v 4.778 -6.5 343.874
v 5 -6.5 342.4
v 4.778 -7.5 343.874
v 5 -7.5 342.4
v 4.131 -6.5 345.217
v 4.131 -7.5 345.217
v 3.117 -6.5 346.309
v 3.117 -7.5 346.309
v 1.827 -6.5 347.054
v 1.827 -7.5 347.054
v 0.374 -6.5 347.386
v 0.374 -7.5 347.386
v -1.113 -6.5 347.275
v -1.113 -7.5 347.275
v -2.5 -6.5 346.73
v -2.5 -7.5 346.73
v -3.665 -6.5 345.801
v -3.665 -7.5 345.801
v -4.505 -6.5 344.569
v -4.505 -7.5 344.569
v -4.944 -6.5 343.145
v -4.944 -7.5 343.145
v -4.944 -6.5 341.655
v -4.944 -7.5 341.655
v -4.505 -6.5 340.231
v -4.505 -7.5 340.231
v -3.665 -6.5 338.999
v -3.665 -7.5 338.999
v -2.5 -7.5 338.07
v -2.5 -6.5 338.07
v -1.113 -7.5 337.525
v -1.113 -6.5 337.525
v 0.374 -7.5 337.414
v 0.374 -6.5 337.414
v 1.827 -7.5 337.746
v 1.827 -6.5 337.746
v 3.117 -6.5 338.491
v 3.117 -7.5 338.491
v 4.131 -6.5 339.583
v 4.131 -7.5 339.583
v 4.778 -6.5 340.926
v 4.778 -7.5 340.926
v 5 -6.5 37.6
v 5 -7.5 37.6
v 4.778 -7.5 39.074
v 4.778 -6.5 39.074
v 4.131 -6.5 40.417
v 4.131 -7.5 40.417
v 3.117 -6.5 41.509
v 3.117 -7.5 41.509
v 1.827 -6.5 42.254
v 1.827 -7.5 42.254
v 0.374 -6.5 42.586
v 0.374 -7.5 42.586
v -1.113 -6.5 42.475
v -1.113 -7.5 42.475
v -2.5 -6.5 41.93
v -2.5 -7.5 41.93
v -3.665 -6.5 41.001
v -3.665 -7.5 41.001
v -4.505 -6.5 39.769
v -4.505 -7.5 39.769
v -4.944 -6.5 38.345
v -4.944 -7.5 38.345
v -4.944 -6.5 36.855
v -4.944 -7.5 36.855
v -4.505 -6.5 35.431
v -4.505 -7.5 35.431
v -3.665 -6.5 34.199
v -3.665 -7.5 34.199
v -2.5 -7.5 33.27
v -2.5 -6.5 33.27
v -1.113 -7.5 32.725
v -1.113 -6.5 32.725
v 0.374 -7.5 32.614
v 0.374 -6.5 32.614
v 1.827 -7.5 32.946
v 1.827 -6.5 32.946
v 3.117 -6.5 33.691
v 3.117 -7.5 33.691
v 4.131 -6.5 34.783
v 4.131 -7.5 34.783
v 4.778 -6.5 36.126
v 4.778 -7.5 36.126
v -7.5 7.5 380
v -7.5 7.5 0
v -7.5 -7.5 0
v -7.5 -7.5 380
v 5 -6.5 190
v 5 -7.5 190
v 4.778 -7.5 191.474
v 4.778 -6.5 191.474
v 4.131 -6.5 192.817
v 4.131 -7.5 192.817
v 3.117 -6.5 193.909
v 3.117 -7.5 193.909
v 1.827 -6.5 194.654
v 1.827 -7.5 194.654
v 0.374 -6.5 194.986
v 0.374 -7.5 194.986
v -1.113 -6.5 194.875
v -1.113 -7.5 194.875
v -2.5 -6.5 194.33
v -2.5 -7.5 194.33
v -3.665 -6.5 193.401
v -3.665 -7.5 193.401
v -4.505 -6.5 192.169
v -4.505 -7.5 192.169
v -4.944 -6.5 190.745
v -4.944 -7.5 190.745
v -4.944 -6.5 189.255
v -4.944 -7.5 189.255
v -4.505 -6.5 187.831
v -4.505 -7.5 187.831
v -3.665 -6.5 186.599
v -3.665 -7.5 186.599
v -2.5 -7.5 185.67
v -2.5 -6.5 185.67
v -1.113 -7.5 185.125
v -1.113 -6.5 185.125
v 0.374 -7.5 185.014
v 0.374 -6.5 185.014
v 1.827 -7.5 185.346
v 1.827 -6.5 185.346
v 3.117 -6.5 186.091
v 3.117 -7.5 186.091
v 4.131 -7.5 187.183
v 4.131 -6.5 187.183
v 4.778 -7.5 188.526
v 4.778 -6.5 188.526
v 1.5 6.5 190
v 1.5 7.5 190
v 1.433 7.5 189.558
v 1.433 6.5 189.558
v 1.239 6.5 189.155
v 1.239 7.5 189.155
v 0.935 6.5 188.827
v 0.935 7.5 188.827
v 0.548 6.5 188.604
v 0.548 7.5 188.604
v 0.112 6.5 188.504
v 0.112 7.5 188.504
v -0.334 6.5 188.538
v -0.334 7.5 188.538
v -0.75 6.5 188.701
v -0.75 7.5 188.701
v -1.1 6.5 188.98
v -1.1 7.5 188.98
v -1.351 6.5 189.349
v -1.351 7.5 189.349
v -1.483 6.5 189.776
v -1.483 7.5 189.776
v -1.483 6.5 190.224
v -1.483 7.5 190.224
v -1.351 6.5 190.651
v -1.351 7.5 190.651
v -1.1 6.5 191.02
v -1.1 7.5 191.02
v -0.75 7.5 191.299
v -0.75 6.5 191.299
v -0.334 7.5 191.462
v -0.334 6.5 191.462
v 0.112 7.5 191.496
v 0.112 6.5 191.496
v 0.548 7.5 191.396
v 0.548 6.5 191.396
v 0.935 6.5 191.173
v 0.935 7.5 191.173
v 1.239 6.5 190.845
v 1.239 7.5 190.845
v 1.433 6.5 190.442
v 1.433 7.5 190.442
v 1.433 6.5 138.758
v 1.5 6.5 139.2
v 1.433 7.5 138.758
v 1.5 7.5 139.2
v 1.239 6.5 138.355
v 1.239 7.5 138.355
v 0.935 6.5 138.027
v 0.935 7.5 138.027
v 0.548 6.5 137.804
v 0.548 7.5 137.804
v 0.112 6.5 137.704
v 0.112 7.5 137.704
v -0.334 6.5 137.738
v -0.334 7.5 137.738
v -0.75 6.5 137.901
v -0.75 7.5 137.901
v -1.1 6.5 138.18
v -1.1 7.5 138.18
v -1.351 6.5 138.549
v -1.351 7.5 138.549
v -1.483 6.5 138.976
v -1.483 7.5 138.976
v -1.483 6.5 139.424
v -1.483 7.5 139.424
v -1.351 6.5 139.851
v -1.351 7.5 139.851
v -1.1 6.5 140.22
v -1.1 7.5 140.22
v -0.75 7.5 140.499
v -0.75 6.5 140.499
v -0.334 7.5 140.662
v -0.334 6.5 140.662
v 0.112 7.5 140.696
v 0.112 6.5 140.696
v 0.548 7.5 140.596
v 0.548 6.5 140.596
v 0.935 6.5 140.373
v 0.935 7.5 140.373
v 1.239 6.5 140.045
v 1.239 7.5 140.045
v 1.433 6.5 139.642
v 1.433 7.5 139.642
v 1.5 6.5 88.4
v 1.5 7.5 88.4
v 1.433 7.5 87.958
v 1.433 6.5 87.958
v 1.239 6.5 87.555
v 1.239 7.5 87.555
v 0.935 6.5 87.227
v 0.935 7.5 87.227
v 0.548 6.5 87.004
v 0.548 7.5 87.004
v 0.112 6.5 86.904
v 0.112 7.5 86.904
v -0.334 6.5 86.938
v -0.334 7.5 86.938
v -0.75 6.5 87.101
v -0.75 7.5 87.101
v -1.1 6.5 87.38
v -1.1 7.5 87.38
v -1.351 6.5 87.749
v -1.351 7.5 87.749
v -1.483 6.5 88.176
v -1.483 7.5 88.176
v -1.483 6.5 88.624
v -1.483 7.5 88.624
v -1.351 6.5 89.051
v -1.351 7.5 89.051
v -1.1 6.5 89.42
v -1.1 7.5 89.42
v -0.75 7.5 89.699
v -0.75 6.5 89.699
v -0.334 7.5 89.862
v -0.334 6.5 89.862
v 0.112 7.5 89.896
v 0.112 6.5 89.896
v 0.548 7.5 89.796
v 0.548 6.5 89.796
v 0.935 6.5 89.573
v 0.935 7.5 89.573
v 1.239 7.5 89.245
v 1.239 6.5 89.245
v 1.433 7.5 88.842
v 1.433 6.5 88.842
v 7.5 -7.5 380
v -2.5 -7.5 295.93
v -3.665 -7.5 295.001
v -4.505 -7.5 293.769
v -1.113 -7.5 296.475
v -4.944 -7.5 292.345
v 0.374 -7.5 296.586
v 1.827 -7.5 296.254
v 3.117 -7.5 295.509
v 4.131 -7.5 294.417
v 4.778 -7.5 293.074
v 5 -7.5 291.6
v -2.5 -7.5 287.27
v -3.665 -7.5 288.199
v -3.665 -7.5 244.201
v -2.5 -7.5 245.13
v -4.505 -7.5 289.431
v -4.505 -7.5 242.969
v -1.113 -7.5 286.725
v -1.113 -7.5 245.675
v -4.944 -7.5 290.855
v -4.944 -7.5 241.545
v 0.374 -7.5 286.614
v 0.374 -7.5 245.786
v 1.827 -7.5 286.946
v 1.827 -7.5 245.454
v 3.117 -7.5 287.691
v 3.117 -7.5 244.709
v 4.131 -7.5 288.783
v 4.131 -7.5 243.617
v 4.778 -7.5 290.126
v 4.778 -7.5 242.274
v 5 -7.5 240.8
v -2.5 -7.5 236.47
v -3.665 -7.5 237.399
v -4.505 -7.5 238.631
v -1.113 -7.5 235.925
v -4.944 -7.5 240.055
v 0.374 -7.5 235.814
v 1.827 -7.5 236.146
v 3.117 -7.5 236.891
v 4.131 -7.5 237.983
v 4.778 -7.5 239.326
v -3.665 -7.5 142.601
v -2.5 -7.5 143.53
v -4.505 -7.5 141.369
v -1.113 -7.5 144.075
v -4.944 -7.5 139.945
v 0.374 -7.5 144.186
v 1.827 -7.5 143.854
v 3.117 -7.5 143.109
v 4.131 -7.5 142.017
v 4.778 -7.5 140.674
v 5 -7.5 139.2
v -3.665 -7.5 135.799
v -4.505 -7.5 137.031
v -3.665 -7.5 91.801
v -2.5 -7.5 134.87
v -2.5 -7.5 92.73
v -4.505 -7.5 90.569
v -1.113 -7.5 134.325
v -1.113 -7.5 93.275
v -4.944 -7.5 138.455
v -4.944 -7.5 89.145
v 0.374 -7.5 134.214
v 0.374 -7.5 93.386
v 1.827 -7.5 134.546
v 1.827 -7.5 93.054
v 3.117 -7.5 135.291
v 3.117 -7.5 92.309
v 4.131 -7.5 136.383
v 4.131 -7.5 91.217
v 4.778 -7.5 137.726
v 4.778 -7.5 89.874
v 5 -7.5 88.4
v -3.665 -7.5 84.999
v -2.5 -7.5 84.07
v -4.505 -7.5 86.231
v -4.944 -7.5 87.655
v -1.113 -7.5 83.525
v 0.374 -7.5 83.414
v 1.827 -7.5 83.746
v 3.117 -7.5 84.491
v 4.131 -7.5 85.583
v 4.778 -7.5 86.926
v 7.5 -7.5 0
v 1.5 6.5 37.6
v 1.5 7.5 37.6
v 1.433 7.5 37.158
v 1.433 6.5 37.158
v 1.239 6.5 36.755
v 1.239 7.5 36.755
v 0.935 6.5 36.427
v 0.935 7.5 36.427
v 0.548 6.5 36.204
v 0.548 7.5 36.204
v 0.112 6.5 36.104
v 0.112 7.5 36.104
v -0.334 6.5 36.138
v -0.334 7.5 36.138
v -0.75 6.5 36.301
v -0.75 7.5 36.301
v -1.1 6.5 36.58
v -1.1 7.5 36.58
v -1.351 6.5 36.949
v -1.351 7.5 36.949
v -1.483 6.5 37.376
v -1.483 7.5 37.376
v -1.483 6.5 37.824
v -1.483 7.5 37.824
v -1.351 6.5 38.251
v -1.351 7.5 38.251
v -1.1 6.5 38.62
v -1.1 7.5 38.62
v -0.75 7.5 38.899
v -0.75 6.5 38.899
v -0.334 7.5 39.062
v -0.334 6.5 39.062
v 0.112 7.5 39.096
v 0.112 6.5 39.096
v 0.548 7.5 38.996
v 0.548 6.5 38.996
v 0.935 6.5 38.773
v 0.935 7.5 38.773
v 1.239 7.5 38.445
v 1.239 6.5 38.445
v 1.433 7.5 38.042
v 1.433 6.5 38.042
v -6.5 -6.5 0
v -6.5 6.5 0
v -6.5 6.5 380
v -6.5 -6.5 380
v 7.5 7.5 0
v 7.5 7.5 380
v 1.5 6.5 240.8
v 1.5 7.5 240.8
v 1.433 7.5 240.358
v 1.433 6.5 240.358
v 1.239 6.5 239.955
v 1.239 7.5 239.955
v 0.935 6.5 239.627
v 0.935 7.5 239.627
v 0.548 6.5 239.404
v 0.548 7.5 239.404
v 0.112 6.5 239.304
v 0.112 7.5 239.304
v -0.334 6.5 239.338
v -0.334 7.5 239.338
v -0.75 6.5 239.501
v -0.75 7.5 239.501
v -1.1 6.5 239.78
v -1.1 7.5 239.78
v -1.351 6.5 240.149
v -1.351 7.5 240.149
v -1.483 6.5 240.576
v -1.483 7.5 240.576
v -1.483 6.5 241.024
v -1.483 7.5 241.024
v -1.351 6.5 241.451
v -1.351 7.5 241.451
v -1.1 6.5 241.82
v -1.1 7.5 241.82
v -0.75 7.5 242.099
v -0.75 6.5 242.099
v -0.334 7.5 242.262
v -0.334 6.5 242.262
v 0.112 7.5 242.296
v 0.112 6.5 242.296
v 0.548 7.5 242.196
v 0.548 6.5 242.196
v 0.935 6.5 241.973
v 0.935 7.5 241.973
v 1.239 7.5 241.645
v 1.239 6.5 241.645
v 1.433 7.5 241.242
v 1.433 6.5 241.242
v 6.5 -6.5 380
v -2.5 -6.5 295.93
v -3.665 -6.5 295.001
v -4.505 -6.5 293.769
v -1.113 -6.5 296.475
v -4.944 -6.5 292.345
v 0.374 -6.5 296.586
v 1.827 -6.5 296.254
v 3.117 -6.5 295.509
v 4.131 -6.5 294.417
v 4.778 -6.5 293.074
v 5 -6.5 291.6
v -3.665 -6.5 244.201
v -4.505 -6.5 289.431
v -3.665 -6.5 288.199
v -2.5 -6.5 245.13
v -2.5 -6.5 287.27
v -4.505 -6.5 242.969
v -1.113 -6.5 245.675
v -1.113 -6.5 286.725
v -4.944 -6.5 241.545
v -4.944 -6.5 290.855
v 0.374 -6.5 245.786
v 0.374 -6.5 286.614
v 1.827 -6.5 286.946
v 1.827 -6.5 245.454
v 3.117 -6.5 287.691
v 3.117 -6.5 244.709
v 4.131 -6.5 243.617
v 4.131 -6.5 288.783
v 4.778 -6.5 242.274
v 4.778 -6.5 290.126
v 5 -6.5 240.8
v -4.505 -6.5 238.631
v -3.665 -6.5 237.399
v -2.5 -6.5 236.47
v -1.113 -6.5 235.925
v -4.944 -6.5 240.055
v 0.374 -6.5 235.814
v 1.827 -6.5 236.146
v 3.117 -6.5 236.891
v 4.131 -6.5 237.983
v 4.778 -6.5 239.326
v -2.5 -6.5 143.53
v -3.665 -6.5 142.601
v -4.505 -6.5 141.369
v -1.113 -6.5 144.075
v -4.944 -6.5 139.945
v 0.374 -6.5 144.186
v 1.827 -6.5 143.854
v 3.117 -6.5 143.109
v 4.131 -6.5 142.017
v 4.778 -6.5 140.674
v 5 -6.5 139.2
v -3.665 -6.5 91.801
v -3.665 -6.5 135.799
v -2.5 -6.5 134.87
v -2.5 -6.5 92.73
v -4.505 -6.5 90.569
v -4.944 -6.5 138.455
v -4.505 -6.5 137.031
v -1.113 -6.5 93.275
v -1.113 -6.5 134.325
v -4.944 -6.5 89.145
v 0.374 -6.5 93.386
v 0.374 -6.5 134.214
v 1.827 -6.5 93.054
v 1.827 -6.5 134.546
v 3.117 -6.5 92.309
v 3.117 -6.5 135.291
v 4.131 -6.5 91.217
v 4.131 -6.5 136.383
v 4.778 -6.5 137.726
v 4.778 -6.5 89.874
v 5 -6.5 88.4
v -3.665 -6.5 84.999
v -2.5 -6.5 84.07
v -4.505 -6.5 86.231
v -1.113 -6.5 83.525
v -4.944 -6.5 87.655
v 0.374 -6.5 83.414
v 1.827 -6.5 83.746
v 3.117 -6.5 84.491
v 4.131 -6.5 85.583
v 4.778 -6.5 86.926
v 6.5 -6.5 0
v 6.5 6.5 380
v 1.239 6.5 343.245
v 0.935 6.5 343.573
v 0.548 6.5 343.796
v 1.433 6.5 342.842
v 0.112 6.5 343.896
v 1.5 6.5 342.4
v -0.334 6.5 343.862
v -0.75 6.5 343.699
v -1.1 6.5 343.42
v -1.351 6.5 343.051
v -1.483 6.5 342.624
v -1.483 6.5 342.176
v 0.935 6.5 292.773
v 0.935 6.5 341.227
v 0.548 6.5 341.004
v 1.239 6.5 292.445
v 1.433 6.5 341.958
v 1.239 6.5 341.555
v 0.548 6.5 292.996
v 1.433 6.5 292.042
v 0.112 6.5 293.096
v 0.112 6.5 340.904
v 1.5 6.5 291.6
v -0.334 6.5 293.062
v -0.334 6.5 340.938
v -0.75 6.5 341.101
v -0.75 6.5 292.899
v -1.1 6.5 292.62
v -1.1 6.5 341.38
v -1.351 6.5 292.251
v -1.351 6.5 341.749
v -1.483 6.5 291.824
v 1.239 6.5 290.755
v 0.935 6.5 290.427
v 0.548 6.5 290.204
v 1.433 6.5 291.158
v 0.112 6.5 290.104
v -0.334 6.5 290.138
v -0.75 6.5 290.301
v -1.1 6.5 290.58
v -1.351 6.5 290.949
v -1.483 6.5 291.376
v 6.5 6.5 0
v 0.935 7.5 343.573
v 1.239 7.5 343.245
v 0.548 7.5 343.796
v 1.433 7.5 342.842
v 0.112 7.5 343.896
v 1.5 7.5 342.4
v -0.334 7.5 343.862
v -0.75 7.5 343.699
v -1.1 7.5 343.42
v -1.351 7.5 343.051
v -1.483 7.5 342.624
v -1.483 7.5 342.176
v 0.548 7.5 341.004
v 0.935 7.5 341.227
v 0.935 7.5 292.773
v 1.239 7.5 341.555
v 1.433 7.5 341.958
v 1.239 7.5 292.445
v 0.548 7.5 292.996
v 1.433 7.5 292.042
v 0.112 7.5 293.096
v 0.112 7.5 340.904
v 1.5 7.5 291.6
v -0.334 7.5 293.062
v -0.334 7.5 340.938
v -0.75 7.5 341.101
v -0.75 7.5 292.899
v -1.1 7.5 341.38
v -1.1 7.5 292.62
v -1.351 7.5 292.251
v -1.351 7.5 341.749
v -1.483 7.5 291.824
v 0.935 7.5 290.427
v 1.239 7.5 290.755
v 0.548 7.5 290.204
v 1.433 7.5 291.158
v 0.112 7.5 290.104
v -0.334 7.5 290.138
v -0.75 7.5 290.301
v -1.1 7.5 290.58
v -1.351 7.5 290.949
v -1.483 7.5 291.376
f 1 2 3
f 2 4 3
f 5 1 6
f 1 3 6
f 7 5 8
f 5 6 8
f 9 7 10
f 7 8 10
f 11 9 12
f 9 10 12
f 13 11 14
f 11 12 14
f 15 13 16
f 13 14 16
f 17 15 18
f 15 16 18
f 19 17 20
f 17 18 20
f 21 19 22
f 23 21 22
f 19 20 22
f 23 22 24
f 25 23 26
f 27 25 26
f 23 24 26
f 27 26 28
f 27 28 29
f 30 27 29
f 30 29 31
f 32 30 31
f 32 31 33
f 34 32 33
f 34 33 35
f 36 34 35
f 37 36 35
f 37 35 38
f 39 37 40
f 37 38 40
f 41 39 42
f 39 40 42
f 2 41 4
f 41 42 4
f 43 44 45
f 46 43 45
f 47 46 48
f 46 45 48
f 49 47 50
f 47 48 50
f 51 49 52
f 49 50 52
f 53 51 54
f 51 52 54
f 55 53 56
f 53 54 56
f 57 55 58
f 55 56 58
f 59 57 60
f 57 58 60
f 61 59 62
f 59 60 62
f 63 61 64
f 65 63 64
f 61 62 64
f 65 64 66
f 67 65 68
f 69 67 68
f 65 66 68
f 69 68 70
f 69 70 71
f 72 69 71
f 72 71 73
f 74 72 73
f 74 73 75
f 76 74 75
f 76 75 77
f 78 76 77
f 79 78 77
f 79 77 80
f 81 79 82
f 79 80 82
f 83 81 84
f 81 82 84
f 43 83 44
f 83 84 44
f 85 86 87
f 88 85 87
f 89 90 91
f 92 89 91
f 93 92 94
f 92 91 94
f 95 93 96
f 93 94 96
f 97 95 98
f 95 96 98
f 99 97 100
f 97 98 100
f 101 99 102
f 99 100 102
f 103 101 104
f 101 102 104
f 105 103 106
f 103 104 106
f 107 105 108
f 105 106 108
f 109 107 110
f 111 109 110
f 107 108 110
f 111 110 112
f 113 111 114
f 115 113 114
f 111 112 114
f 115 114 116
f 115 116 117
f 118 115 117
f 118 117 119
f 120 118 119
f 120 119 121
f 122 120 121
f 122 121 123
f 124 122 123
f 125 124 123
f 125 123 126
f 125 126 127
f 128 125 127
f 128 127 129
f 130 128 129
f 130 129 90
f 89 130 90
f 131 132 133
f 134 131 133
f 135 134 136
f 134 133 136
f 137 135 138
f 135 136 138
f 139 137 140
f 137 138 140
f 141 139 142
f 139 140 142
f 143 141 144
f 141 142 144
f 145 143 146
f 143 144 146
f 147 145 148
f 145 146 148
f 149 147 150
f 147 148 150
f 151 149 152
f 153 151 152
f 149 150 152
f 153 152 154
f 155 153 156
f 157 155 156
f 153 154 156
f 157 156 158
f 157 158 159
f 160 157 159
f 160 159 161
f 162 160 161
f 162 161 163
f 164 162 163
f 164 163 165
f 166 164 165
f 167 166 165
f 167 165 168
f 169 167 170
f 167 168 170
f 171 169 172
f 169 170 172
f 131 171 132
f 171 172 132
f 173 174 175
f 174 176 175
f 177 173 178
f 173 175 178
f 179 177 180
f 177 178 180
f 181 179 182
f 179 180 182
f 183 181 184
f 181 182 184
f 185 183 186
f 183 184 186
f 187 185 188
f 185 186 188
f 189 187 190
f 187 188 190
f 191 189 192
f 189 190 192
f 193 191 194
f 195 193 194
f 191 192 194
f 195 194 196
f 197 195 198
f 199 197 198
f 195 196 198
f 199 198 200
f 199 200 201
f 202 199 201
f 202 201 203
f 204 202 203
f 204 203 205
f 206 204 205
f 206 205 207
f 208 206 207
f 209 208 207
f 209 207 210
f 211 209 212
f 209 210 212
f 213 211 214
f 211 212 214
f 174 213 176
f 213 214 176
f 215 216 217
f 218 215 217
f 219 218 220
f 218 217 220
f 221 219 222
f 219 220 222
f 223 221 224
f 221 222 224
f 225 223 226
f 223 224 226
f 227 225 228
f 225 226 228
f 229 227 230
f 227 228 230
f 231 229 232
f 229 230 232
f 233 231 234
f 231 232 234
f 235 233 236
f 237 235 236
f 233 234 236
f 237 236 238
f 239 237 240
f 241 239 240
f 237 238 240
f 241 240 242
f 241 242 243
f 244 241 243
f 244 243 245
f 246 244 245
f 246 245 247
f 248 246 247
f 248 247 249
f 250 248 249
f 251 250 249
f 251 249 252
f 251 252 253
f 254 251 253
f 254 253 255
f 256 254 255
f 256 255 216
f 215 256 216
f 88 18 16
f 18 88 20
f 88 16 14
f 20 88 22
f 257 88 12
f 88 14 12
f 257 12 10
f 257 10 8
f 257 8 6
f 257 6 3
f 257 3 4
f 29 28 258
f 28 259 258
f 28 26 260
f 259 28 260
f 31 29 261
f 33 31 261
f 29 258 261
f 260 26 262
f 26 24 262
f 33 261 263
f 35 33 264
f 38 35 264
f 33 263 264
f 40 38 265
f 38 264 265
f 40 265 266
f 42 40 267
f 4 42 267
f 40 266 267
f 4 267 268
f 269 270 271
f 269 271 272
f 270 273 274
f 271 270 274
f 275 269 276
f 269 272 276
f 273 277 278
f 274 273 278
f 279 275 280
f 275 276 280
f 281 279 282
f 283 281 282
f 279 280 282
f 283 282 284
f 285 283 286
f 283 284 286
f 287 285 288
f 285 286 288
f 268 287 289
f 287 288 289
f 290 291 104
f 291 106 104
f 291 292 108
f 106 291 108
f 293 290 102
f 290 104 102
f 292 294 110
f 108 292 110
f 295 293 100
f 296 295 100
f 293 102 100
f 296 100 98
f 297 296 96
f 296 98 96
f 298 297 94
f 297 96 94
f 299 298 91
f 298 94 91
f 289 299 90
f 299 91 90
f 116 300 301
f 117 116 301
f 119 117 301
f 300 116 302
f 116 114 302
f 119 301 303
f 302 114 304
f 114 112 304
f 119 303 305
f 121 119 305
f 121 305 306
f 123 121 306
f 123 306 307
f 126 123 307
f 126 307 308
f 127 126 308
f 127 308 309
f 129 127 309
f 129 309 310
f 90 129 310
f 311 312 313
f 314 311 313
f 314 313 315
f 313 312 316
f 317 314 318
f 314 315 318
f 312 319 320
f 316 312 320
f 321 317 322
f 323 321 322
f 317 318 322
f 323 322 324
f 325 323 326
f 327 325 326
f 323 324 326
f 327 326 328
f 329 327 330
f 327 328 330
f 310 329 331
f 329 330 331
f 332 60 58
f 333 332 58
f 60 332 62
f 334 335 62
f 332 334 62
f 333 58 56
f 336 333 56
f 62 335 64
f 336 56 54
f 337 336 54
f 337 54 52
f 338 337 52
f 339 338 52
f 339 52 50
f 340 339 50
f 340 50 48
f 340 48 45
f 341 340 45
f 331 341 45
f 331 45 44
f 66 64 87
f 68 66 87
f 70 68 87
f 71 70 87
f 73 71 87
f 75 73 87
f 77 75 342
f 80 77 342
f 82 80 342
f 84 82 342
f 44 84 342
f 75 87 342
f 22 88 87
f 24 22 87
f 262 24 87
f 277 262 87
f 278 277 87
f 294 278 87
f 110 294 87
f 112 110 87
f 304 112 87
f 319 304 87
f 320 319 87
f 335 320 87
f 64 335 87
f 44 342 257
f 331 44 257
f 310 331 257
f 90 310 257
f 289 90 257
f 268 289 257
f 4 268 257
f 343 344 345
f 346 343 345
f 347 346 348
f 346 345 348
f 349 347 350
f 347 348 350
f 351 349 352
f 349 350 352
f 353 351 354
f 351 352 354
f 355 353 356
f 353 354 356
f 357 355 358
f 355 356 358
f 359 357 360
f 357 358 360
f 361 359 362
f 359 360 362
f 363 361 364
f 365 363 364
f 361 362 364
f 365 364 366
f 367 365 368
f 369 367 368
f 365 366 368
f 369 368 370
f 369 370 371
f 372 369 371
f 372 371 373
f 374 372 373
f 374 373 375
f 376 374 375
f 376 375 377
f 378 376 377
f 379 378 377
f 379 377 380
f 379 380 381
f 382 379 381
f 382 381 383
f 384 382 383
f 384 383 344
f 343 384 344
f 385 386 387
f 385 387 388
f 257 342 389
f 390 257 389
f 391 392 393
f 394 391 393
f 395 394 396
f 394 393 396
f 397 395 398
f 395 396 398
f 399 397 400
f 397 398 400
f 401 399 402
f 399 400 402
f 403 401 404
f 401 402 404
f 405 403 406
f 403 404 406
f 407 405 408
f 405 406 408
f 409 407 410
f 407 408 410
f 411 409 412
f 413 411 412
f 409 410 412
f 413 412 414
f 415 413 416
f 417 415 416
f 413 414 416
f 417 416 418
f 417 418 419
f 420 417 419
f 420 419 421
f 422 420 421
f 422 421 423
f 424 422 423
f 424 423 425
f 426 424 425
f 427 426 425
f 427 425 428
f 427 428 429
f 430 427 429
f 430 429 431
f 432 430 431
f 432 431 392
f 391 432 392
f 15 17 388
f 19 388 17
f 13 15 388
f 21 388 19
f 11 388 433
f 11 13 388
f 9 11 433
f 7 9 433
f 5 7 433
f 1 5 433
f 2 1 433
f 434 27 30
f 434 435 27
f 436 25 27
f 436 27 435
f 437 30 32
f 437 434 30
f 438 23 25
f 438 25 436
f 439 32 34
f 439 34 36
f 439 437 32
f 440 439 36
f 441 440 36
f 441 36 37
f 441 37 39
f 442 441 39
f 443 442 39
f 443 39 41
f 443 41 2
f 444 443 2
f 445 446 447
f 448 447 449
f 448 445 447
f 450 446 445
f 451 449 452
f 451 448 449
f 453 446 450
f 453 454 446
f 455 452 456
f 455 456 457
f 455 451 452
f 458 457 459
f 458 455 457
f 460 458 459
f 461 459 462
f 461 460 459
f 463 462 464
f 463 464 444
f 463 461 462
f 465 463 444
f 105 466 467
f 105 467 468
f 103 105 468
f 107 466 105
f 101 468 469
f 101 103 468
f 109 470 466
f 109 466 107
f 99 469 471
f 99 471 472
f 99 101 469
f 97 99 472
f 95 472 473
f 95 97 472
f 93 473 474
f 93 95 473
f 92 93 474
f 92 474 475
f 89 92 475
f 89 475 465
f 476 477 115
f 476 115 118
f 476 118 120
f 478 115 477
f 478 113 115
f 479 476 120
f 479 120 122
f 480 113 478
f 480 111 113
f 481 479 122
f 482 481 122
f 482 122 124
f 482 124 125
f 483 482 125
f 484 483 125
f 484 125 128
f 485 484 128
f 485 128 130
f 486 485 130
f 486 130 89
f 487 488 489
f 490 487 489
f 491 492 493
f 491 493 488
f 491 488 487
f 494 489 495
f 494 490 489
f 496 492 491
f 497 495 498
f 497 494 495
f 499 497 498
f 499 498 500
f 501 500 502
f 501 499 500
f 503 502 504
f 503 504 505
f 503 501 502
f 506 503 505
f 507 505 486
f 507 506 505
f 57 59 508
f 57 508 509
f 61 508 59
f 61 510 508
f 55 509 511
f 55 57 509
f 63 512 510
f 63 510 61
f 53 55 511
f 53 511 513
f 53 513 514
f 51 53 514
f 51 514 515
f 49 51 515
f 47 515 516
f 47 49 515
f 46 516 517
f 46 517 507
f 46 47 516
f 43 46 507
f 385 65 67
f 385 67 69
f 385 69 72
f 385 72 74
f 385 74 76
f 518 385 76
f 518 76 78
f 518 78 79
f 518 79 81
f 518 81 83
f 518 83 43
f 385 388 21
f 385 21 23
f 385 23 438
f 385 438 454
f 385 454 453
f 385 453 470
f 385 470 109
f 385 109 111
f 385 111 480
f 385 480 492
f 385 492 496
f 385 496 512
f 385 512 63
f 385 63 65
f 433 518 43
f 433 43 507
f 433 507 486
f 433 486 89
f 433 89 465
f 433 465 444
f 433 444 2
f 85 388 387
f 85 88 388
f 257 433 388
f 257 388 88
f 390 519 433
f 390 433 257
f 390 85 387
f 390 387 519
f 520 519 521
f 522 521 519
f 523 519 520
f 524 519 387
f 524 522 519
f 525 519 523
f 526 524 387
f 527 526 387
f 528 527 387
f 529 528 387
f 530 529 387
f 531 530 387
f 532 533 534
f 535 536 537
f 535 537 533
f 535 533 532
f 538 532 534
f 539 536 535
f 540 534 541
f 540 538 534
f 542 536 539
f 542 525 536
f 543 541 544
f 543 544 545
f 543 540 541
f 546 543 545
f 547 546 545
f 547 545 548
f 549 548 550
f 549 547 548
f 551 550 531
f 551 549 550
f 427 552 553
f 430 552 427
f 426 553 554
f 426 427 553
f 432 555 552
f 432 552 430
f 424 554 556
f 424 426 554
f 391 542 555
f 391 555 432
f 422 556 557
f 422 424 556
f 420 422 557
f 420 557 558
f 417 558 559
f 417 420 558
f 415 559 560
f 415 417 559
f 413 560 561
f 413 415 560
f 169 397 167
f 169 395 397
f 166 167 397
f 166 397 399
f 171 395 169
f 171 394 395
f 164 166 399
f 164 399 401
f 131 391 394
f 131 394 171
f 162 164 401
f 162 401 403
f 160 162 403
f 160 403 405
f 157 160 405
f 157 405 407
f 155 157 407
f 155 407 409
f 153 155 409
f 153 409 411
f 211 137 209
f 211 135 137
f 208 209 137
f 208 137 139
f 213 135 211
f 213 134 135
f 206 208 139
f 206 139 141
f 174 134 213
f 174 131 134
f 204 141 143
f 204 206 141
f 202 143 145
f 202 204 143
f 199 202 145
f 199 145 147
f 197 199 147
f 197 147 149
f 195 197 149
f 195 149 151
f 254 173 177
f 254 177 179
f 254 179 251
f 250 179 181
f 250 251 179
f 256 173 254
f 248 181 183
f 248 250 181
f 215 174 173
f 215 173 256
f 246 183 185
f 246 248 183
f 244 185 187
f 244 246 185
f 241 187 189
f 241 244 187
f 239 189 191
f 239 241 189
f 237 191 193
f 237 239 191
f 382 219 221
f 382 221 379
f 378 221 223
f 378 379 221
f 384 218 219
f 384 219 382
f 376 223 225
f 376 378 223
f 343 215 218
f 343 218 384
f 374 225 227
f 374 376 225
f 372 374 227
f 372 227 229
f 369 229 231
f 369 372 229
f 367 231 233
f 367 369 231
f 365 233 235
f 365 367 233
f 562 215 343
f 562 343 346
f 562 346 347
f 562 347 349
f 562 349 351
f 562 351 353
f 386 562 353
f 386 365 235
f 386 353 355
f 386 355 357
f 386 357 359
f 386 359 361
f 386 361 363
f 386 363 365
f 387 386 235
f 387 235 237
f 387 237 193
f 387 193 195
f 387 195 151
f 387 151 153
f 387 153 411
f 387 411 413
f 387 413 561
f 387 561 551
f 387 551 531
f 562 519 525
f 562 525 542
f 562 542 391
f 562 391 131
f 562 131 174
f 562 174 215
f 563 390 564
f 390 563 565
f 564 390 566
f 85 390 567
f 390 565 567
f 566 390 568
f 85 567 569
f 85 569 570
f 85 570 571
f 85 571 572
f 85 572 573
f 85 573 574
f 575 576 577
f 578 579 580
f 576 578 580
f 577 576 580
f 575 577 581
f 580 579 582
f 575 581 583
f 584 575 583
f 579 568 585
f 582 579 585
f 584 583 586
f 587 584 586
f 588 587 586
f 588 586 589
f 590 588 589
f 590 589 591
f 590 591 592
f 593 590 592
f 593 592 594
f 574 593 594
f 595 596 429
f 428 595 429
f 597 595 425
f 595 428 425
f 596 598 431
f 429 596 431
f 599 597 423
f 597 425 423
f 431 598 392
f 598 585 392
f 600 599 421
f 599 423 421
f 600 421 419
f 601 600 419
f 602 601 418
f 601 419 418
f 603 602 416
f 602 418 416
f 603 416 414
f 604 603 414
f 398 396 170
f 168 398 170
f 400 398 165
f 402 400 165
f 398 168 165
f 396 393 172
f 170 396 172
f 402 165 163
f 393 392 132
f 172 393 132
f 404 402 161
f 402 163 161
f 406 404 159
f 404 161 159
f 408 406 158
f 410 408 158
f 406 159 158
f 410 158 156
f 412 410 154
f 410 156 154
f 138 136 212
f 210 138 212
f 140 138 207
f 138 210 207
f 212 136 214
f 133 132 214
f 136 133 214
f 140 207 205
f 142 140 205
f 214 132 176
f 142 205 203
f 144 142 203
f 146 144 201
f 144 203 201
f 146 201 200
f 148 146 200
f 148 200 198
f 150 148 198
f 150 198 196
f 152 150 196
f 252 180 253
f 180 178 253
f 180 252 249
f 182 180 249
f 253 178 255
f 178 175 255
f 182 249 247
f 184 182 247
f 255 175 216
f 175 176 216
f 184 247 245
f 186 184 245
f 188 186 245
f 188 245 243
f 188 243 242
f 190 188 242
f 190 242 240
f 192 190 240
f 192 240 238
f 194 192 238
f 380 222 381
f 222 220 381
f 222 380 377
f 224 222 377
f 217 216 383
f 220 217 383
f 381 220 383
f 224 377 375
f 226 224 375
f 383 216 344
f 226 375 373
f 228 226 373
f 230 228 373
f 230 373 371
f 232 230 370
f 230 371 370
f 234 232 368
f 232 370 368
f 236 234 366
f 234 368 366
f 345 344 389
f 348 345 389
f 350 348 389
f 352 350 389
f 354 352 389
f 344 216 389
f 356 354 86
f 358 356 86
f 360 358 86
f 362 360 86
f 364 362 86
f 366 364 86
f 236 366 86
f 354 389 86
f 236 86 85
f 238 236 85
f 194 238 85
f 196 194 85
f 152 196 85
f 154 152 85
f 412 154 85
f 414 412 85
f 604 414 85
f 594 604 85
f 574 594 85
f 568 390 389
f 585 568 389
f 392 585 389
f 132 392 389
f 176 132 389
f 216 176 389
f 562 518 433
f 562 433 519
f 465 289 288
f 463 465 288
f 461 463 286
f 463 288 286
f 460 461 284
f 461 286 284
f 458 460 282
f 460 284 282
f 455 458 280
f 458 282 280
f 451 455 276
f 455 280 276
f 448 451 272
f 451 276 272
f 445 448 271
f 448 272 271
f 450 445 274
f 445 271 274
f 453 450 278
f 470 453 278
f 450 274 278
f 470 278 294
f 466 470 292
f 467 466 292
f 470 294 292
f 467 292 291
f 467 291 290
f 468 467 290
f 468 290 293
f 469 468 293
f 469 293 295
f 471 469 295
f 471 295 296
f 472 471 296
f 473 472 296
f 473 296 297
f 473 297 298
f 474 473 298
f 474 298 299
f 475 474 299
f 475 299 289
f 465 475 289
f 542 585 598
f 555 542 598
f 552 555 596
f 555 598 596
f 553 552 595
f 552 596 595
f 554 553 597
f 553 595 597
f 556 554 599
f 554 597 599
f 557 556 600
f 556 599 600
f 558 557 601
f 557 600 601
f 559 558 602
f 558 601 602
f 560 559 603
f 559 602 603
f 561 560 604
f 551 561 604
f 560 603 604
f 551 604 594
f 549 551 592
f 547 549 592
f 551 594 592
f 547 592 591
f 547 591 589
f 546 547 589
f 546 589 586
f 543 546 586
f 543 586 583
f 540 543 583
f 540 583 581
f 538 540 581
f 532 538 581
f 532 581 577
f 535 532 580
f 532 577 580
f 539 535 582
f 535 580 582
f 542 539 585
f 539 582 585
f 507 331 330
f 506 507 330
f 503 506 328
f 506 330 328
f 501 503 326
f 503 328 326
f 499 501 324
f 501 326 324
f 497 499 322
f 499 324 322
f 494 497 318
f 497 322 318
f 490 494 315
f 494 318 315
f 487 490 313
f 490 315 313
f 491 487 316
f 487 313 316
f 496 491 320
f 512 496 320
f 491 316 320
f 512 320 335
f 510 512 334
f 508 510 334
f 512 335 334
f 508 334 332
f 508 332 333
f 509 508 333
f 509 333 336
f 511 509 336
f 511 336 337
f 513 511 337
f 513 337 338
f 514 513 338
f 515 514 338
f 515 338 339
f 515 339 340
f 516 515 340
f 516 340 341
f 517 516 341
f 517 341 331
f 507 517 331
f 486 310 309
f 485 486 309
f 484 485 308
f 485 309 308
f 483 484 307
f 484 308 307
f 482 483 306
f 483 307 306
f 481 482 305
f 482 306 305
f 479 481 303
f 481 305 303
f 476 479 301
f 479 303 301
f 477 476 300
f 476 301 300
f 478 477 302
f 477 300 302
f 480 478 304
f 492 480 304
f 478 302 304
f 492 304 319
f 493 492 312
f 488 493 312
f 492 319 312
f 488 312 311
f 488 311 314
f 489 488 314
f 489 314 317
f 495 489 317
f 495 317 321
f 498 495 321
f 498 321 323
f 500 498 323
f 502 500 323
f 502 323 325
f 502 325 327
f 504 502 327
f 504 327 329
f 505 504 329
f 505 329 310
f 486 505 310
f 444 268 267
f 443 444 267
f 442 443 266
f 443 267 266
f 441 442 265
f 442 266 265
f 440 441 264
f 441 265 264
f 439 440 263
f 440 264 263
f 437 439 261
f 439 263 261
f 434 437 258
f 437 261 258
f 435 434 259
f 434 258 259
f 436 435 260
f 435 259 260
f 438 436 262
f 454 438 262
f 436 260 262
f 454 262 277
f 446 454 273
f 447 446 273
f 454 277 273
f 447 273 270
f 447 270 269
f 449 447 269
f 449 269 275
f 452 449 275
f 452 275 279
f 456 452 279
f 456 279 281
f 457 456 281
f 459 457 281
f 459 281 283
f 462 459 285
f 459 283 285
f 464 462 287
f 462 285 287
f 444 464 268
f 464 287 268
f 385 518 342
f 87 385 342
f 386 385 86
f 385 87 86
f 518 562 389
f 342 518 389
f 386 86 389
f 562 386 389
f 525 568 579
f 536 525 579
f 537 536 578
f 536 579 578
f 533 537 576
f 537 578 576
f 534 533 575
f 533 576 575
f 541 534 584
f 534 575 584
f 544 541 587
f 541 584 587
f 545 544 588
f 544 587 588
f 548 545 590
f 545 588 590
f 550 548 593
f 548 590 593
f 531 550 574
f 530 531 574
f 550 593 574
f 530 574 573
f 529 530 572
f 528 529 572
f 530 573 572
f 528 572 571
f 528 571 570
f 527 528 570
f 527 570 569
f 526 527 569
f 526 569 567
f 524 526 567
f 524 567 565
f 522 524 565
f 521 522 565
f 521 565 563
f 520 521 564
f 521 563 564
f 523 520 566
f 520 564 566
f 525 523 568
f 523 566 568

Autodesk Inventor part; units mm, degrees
ref_plane "YZ Plane" through (0, 0, 0) normal (1, 0, 0) x (0, 1, 0)
ref_plane "XZ Plane" through (0, 0, 0) normal (0, 1, 0) x (-1, 0, 0)
ref_plane "XY Plane" through (0, 0, 0) normal (0, 0, 1) x (1, 0, 0)
sketch "Náčrt1" plane through (0, 0, 0) normal (0, 0, 1) x (1, 0, 0)
  line L0 (-7.5, -7.5) -> (7.5, -7.5)
  line L1 (7.5, -7.5) -> (7.5, 7.5)
  line L2 (7.5, 7.5) -> (-7.5, 7.5)
  line L3 (-7.5, 7.5) -> (-7.5, -7.5)
  line L4 (-7.5, -7.5) -> (7.5, 7.5) construction
  line L5 (7.5, -7.5) -> (-7.5, 7.5) construction
  line L6 (-6.5, -6.5) -> (6.5, -6.5)
  line L7 (6.5, -6.5) -> (6.5, 6.5)
  line L8 (6.5, 6.5) -> (-6.5, 6.5)
  line L9 (-6.5, 6.5) -> (-6.5, -6.5)
  line L10 (-6.5, -6.5) -> (6.5, 6.5) construction
  line L11 (6.5, -6.5) -> (-6.5, 6.5) construction
  point P0 (0, 0)
  dimension "d0" = 15
  dimension "d1" = 15
  dimension "d2" = 13
  dimension "d3" = 13
extrude "Vysunutí1" add sketch "Náčrt1" along normal blind 380
sketch "Náčrt2" plane through (-7.5, 7.5, 0) normal (0, 1, 0) x (1, 0, 0)
  circle A0 centre (7.5, -37.6) radius 1.5
  line L0 (15, 0) -> (0, 0) projected
  line L1 (0, 0) -> (0, -380) projected
  line L2 (15, -380) -> (0, -380) projected
  line L3 (15, 0) -> (15, -380) projected
  point P0 (7.5, 0)
  dimension "d8" = 3
  dimension "d13" = 37.6
  dimension "d19" = 7.5
extrude "Vysunutí2" cut sketch "Náčrt2" against normal up to surface (1 mm away) contours A0
sketch "Náčrt3" plane through (-7.5, -7.5, 0) normal (0, -1, 0) x (1, 0, 0)
  line L0 (15, 0) -> (0, 0) projected
  line L1 (0, 0) -> (0, 380) projected
  line L2 (15, 380) -> (0, 380) projected
  line L3 (15, 0) -> (15, 380) projected
  circle A0 centre (7.5, 37.6) radius 1.5 projected
  circle A1 centre (7.5, 37.6) radius 5
  point P0 (7.5, 0)
  dimension "d15" = 10
extrude "Vysunutí3" cut sketch "Náčrt3" against normal up to surface (1 mm away) contours A0 | A1
pattern_linear "Obdélníkové pole1" count 7 spacing 50.8 along (0, 0, 1) of "Vysunutí2"
pattern_linear "Obdélníkové pole2" count 7 spacing 50.8 along (0, 0, 1) of "Vysunutí3"
equation "\"d0\" = width"
equation "\"d1\" = width"
equation "\"d2\" = width - 2 * thickness"
equation "\"d3\" = width - 2 * thickness"
equation "\"d4\" = length"
equation "\"d8\" = HoleDia"
equation "\"d19\" = 0.5 * width"
equation "\"d15\" = HoleDiaOpposite"
equation "\"d22\" = holeDistance"
equation "\"d25\" = holeDistance"
equation "\"width\" = gSquareProfile_Width_Cabinet"
equation "\"thickness\" = gSquareProfile_Thickness_Cabinet"
equation "\"length\" = gCabinet_LogicCircuit_Length - 2 * width"
equation "\"holeDistance\" = 50.8"
equation "\"HoleDiaOpposite\" = 10"
equation "\"HoleDia\" = 3"
equation "\"gSquareProfile_Width_Cabinet\" = 15"
equation "\"gSquareProfile_Thickness_Cabinet\" = 1"
equation "\"gCabinet_LogicCircuit_Length\" = 410"
properties part number "Profile-Square#07"
